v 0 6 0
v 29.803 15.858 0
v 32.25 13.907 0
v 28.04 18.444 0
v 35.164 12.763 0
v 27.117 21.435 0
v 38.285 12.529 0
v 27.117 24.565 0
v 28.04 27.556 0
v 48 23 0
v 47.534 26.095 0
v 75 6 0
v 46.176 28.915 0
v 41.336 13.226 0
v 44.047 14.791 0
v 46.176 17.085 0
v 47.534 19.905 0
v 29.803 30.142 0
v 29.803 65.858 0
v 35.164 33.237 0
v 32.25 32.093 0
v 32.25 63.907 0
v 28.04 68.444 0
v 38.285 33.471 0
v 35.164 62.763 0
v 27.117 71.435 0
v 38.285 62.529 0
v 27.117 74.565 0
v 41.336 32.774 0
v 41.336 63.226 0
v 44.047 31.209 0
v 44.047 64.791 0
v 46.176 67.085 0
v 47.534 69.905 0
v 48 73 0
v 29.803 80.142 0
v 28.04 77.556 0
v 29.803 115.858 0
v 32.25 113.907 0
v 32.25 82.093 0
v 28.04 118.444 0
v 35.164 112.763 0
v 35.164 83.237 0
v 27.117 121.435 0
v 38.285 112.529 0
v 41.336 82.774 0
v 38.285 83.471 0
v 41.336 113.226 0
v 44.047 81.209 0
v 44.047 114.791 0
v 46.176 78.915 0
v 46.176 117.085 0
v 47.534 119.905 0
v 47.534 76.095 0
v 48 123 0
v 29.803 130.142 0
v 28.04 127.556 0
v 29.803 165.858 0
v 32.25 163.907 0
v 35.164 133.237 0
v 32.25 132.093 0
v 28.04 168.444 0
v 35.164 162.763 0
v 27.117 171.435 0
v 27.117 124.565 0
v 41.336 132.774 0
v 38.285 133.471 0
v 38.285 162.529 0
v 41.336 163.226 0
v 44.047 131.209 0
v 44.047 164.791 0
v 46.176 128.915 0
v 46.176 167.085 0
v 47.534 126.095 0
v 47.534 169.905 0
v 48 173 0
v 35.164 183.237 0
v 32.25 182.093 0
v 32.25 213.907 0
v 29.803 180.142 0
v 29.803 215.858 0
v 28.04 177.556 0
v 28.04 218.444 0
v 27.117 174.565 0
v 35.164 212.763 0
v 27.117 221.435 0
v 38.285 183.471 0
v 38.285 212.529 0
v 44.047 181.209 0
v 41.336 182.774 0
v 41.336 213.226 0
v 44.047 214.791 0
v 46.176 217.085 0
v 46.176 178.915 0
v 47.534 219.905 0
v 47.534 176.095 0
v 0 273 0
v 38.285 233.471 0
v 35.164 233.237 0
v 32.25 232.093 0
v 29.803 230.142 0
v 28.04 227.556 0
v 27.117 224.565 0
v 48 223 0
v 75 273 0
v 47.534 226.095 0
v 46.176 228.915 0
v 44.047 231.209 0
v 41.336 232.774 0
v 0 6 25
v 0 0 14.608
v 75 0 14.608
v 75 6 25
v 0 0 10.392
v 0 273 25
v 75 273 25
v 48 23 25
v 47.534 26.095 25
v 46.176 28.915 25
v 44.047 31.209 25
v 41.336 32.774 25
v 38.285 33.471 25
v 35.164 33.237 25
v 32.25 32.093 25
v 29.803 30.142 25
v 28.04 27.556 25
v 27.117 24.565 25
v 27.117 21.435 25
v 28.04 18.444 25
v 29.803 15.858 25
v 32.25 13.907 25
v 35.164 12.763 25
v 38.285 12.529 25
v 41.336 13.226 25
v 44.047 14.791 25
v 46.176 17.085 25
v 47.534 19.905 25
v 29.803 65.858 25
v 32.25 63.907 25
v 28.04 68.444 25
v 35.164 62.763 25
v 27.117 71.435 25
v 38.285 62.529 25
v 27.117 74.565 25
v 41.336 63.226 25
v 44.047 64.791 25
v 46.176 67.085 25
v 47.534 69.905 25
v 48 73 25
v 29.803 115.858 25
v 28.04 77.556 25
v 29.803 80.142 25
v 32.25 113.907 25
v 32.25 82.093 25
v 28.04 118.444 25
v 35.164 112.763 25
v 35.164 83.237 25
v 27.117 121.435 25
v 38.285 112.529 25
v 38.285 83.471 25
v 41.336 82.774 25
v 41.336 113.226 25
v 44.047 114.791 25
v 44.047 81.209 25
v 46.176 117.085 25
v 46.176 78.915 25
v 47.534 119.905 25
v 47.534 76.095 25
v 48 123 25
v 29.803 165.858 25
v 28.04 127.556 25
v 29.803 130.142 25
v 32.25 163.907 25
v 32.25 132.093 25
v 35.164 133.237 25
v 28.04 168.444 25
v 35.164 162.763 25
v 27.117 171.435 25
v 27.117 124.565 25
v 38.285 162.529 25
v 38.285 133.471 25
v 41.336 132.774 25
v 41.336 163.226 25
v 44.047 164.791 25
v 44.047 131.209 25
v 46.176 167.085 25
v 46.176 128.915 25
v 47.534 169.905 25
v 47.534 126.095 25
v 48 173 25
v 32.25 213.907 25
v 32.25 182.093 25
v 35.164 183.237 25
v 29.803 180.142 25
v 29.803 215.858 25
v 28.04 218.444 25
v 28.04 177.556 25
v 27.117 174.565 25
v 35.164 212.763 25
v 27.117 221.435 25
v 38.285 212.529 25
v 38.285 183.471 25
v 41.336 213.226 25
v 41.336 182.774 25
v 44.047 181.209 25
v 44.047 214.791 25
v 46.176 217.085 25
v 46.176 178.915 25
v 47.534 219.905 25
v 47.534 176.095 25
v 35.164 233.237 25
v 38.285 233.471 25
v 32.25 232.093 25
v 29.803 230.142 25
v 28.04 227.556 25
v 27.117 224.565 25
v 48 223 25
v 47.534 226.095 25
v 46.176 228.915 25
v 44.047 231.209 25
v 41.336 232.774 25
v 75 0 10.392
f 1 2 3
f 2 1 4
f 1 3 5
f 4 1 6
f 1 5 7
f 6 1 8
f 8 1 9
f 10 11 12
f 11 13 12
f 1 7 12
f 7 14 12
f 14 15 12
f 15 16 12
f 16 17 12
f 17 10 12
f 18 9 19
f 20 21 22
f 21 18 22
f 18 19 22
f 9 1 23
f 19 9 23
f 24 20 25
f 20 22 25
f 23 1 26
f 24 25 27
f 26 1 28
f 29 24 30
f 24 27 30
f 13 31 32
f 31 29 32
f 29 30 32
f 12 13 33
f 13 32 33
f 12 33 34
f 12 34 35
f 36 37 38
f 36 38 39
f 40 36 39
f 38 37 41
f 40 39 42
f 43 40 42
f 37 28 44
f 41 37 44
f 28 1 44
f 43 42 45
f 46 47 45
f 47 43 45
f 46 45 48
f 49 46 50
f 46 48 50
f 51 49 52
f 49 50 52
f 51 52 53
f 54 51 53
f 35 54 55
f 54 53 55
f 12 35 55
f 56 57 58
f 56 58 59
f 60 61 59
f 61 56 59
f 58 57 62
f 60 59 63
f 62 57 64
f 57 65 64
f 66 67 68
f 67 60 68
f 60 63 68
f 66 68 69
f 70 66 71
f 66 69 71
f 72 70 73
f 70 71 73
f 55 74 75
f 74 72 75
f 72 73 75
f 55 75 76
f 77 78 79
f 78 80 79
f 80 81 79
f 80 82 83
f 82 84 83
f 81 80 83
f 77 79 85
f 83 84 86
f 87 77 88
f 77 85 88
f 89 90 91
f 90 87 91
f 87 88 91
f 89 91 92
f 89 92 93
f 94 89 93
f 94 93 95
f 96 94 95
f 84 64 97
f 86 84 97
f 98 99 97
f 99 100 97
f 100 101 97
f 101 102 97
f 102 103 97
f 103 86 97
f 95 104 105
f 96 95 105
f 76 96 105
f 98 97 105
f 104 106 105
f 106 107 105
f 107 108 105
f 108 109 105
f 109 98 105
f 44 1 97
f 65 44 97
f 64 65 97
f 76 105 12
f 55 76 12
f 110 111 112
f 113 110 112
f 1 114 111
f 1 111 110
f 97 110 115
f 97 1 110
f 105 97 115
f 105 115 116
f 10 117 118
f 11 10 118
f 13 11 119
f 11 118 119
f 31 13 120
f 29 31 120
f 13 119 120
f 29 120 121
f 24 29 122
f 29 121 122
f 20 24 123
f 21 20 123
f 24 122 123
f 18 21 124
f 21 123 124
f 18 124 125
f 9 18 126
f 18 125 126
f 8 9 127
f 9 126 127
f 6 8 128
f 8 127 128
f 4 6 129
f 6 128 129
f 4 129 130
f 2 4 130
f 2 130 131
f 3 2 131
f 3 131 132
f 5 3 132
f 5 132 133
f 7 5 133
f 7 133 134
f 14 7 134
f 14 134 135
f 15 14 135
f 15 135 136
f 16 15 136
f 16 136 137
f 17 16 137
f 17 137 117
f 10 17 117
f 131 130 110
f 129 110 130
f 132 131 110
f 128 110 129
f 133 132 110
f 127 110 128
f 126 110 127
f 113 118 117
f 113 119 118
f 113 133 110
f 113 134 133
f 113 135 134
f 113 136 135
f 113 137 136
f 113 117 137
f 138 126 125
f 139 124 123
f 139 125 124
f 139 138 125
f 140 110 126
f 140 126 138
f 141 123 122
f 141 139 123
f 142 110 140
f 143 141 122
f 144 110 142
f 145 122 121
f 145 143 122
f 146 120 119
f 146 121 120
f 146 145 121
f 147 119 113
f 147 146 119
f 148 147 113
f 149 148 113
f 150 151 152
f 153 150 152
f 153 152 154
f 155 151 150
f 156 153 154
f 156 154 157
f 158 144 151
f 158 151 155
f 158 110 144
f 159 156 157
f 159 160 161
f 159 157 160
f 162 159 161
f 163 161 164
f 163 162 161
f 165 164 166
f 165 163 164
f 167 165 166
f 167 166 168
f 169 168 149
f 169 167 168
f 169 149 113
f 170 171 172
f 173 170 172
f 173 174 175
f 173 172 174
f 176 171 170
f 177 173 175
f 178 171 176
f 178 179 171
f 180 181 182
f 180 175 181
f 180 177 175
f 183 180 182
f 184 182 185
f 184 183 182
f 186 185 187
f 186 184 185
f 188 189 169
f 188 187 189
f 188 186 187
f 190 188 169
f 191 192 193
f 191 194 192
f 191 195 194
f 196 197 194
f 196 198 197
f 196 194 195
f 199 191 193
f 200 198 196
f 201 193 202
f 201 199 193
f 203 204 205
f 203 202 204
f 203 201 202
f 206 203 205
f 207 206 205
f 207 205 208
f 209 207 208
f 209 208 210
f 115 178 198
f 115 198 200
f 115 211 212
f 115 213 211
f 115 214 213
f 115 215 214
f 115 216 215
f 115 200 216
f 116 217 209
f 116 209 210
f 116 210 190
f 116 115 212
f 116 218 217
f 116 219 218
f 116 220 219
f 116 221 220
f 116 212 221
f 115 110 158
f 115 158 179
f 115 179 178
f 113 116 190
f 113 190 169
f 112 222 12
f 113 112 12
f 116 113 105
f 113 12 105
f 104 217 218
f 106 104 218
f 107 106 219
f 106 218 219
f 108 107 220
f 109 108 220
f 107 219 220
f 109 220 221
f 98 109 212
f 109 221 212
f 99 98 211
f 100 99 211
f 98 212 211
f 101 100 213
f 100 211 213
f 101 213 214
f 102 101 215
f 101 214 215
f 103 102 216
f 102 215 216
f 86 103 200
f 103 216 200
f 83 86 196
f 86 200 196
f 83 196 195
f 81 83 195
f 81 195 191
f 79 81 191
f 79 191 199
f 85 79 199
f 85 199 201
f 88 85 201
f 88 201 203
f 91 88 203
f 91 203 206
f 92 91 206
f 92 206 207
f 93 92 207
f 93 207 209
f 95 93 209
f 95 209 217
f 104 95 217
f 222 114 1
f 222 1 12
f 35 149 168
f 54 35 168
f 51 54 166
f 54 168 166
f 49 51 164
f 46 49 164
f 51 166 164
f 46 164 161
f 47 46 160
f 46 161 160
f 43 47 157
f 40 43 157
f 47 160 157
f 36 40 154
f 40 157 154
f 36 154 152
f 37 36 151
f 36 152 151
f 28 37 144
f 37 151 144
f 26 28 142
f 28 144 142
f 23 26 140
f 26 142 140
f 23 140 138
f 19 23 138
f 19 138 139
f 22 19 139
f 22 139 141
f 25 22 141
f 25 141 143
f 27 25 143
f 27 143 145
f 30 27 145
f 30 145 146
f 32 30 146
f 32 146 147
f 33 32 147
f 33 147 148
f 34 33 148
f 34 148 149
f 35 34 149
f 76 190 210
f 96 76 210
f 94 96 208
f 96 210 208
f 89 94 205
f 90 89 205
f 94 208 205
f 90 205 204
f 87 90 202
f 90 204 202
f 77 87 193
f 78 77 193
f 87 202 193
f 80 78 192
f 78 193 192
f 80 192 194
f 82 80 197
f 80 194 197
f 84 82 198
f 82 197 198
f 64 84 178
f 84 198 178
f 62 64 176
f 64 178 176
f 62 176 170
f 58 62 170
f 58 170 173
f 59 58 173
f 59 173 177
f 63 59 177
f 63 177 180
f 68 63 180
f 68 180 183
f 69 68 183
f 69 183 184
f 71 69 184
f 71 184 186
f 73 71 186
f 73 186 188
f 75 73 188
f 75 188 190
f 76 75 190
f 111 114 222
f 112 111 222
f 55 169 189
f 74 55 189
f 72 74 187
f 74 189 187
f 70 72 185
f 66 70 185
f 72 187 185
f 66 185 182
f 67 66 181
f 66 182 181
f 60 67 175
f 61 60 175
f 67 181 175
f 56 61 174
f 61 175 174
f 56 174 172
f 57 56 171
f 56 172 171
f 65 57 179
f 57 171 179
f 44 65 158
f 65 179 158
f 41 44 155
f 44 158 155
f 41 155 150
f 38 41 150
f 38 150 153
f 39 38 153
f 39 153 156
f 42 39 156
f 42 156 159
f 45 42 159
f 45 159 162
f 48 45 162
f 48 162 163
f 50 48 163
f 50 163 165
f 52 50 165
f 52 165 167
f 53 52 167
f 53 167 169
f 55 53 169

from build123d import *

# Parameters (mm, degrees)
SKETCH_1_W          = 75
SKETCH_1_H          = 273
EXTRUDE_1_DEPTH     = 25
SKETCH_2_R          = 10.5
CUT_EXTRUDE_1_DEPTH = 26
CHAMFER_1_SIZE      = 6
CHAMFER_1_SIZE2     = 10.392304845
CHAMFER_2_SIZE      = 6
CHAMFER_2_SIZE2     = 10.392304845


with BuildPart() as part:
    # Эскиз1 → Бобышка-Вытянуть1 (new body)
    with BuildSketch(Plane.XY):
        with Locations((37.5, 136.5)):
            Rectangle(SKETCH_1_W, SKETCH_1_H)
    extrude(amount=EXTRUDE_1_DEPTH)

    # Эскиз2 → Вырез-Вытянуть1 (cut, through all)
    with BuildSketch(Plane.XY.offset(25)):
        with Locations((37.5, 23)):
            Circle(SKETCH_2_R)
        with Locations((37.5, 73)):
            Circle(SKETCH_2_R)
        with Locations((37.5, 123)):
            Circle(SKETCH_2_R)
        with Locations((37.5, 173)):
            Circle(SKETCH_2_R)
        with Locations((37.5, 223)):
            Circle(SKETCH_2_R)
    extrude(amount=-CUT_EXTRUDE_1_DEPTH, mode=Mode.SUBTRACT)

    # Фаска1
    chamfer_1_edges = [part.edges().sort_by_distance(p)[0] for p in [
        (37.5, 0, 0),
    ]]
    chamfer_1_side = [part.faces().sort_by_distance(p)[0] for p in [
        (37.5, 137.747350693, 0),
    ]]
    chamfer(chamfer_1_edges, length=CHAMFER_1_SIZE, length2=CHAMFER_1_SIZE2, reference=chamfer_1_side[0])

    # Фаска2
    chamfer_2_edges = [part.edges().sort_by_distance(p)[0] for p in [
        (37.5, 0, 25),
    ]]
    chamfer_2_side = [part.faces().sort_by_distance(p)[0] for p in [
        (37.5, 137.747350693, 25),
    ]]
    chamfer(chamfer_2_edges, length=CHAMFER_2_SIZE, length2=CHAMFER_2_SIZE2, reference=chamfer_2_side[0])


solid = part.part
